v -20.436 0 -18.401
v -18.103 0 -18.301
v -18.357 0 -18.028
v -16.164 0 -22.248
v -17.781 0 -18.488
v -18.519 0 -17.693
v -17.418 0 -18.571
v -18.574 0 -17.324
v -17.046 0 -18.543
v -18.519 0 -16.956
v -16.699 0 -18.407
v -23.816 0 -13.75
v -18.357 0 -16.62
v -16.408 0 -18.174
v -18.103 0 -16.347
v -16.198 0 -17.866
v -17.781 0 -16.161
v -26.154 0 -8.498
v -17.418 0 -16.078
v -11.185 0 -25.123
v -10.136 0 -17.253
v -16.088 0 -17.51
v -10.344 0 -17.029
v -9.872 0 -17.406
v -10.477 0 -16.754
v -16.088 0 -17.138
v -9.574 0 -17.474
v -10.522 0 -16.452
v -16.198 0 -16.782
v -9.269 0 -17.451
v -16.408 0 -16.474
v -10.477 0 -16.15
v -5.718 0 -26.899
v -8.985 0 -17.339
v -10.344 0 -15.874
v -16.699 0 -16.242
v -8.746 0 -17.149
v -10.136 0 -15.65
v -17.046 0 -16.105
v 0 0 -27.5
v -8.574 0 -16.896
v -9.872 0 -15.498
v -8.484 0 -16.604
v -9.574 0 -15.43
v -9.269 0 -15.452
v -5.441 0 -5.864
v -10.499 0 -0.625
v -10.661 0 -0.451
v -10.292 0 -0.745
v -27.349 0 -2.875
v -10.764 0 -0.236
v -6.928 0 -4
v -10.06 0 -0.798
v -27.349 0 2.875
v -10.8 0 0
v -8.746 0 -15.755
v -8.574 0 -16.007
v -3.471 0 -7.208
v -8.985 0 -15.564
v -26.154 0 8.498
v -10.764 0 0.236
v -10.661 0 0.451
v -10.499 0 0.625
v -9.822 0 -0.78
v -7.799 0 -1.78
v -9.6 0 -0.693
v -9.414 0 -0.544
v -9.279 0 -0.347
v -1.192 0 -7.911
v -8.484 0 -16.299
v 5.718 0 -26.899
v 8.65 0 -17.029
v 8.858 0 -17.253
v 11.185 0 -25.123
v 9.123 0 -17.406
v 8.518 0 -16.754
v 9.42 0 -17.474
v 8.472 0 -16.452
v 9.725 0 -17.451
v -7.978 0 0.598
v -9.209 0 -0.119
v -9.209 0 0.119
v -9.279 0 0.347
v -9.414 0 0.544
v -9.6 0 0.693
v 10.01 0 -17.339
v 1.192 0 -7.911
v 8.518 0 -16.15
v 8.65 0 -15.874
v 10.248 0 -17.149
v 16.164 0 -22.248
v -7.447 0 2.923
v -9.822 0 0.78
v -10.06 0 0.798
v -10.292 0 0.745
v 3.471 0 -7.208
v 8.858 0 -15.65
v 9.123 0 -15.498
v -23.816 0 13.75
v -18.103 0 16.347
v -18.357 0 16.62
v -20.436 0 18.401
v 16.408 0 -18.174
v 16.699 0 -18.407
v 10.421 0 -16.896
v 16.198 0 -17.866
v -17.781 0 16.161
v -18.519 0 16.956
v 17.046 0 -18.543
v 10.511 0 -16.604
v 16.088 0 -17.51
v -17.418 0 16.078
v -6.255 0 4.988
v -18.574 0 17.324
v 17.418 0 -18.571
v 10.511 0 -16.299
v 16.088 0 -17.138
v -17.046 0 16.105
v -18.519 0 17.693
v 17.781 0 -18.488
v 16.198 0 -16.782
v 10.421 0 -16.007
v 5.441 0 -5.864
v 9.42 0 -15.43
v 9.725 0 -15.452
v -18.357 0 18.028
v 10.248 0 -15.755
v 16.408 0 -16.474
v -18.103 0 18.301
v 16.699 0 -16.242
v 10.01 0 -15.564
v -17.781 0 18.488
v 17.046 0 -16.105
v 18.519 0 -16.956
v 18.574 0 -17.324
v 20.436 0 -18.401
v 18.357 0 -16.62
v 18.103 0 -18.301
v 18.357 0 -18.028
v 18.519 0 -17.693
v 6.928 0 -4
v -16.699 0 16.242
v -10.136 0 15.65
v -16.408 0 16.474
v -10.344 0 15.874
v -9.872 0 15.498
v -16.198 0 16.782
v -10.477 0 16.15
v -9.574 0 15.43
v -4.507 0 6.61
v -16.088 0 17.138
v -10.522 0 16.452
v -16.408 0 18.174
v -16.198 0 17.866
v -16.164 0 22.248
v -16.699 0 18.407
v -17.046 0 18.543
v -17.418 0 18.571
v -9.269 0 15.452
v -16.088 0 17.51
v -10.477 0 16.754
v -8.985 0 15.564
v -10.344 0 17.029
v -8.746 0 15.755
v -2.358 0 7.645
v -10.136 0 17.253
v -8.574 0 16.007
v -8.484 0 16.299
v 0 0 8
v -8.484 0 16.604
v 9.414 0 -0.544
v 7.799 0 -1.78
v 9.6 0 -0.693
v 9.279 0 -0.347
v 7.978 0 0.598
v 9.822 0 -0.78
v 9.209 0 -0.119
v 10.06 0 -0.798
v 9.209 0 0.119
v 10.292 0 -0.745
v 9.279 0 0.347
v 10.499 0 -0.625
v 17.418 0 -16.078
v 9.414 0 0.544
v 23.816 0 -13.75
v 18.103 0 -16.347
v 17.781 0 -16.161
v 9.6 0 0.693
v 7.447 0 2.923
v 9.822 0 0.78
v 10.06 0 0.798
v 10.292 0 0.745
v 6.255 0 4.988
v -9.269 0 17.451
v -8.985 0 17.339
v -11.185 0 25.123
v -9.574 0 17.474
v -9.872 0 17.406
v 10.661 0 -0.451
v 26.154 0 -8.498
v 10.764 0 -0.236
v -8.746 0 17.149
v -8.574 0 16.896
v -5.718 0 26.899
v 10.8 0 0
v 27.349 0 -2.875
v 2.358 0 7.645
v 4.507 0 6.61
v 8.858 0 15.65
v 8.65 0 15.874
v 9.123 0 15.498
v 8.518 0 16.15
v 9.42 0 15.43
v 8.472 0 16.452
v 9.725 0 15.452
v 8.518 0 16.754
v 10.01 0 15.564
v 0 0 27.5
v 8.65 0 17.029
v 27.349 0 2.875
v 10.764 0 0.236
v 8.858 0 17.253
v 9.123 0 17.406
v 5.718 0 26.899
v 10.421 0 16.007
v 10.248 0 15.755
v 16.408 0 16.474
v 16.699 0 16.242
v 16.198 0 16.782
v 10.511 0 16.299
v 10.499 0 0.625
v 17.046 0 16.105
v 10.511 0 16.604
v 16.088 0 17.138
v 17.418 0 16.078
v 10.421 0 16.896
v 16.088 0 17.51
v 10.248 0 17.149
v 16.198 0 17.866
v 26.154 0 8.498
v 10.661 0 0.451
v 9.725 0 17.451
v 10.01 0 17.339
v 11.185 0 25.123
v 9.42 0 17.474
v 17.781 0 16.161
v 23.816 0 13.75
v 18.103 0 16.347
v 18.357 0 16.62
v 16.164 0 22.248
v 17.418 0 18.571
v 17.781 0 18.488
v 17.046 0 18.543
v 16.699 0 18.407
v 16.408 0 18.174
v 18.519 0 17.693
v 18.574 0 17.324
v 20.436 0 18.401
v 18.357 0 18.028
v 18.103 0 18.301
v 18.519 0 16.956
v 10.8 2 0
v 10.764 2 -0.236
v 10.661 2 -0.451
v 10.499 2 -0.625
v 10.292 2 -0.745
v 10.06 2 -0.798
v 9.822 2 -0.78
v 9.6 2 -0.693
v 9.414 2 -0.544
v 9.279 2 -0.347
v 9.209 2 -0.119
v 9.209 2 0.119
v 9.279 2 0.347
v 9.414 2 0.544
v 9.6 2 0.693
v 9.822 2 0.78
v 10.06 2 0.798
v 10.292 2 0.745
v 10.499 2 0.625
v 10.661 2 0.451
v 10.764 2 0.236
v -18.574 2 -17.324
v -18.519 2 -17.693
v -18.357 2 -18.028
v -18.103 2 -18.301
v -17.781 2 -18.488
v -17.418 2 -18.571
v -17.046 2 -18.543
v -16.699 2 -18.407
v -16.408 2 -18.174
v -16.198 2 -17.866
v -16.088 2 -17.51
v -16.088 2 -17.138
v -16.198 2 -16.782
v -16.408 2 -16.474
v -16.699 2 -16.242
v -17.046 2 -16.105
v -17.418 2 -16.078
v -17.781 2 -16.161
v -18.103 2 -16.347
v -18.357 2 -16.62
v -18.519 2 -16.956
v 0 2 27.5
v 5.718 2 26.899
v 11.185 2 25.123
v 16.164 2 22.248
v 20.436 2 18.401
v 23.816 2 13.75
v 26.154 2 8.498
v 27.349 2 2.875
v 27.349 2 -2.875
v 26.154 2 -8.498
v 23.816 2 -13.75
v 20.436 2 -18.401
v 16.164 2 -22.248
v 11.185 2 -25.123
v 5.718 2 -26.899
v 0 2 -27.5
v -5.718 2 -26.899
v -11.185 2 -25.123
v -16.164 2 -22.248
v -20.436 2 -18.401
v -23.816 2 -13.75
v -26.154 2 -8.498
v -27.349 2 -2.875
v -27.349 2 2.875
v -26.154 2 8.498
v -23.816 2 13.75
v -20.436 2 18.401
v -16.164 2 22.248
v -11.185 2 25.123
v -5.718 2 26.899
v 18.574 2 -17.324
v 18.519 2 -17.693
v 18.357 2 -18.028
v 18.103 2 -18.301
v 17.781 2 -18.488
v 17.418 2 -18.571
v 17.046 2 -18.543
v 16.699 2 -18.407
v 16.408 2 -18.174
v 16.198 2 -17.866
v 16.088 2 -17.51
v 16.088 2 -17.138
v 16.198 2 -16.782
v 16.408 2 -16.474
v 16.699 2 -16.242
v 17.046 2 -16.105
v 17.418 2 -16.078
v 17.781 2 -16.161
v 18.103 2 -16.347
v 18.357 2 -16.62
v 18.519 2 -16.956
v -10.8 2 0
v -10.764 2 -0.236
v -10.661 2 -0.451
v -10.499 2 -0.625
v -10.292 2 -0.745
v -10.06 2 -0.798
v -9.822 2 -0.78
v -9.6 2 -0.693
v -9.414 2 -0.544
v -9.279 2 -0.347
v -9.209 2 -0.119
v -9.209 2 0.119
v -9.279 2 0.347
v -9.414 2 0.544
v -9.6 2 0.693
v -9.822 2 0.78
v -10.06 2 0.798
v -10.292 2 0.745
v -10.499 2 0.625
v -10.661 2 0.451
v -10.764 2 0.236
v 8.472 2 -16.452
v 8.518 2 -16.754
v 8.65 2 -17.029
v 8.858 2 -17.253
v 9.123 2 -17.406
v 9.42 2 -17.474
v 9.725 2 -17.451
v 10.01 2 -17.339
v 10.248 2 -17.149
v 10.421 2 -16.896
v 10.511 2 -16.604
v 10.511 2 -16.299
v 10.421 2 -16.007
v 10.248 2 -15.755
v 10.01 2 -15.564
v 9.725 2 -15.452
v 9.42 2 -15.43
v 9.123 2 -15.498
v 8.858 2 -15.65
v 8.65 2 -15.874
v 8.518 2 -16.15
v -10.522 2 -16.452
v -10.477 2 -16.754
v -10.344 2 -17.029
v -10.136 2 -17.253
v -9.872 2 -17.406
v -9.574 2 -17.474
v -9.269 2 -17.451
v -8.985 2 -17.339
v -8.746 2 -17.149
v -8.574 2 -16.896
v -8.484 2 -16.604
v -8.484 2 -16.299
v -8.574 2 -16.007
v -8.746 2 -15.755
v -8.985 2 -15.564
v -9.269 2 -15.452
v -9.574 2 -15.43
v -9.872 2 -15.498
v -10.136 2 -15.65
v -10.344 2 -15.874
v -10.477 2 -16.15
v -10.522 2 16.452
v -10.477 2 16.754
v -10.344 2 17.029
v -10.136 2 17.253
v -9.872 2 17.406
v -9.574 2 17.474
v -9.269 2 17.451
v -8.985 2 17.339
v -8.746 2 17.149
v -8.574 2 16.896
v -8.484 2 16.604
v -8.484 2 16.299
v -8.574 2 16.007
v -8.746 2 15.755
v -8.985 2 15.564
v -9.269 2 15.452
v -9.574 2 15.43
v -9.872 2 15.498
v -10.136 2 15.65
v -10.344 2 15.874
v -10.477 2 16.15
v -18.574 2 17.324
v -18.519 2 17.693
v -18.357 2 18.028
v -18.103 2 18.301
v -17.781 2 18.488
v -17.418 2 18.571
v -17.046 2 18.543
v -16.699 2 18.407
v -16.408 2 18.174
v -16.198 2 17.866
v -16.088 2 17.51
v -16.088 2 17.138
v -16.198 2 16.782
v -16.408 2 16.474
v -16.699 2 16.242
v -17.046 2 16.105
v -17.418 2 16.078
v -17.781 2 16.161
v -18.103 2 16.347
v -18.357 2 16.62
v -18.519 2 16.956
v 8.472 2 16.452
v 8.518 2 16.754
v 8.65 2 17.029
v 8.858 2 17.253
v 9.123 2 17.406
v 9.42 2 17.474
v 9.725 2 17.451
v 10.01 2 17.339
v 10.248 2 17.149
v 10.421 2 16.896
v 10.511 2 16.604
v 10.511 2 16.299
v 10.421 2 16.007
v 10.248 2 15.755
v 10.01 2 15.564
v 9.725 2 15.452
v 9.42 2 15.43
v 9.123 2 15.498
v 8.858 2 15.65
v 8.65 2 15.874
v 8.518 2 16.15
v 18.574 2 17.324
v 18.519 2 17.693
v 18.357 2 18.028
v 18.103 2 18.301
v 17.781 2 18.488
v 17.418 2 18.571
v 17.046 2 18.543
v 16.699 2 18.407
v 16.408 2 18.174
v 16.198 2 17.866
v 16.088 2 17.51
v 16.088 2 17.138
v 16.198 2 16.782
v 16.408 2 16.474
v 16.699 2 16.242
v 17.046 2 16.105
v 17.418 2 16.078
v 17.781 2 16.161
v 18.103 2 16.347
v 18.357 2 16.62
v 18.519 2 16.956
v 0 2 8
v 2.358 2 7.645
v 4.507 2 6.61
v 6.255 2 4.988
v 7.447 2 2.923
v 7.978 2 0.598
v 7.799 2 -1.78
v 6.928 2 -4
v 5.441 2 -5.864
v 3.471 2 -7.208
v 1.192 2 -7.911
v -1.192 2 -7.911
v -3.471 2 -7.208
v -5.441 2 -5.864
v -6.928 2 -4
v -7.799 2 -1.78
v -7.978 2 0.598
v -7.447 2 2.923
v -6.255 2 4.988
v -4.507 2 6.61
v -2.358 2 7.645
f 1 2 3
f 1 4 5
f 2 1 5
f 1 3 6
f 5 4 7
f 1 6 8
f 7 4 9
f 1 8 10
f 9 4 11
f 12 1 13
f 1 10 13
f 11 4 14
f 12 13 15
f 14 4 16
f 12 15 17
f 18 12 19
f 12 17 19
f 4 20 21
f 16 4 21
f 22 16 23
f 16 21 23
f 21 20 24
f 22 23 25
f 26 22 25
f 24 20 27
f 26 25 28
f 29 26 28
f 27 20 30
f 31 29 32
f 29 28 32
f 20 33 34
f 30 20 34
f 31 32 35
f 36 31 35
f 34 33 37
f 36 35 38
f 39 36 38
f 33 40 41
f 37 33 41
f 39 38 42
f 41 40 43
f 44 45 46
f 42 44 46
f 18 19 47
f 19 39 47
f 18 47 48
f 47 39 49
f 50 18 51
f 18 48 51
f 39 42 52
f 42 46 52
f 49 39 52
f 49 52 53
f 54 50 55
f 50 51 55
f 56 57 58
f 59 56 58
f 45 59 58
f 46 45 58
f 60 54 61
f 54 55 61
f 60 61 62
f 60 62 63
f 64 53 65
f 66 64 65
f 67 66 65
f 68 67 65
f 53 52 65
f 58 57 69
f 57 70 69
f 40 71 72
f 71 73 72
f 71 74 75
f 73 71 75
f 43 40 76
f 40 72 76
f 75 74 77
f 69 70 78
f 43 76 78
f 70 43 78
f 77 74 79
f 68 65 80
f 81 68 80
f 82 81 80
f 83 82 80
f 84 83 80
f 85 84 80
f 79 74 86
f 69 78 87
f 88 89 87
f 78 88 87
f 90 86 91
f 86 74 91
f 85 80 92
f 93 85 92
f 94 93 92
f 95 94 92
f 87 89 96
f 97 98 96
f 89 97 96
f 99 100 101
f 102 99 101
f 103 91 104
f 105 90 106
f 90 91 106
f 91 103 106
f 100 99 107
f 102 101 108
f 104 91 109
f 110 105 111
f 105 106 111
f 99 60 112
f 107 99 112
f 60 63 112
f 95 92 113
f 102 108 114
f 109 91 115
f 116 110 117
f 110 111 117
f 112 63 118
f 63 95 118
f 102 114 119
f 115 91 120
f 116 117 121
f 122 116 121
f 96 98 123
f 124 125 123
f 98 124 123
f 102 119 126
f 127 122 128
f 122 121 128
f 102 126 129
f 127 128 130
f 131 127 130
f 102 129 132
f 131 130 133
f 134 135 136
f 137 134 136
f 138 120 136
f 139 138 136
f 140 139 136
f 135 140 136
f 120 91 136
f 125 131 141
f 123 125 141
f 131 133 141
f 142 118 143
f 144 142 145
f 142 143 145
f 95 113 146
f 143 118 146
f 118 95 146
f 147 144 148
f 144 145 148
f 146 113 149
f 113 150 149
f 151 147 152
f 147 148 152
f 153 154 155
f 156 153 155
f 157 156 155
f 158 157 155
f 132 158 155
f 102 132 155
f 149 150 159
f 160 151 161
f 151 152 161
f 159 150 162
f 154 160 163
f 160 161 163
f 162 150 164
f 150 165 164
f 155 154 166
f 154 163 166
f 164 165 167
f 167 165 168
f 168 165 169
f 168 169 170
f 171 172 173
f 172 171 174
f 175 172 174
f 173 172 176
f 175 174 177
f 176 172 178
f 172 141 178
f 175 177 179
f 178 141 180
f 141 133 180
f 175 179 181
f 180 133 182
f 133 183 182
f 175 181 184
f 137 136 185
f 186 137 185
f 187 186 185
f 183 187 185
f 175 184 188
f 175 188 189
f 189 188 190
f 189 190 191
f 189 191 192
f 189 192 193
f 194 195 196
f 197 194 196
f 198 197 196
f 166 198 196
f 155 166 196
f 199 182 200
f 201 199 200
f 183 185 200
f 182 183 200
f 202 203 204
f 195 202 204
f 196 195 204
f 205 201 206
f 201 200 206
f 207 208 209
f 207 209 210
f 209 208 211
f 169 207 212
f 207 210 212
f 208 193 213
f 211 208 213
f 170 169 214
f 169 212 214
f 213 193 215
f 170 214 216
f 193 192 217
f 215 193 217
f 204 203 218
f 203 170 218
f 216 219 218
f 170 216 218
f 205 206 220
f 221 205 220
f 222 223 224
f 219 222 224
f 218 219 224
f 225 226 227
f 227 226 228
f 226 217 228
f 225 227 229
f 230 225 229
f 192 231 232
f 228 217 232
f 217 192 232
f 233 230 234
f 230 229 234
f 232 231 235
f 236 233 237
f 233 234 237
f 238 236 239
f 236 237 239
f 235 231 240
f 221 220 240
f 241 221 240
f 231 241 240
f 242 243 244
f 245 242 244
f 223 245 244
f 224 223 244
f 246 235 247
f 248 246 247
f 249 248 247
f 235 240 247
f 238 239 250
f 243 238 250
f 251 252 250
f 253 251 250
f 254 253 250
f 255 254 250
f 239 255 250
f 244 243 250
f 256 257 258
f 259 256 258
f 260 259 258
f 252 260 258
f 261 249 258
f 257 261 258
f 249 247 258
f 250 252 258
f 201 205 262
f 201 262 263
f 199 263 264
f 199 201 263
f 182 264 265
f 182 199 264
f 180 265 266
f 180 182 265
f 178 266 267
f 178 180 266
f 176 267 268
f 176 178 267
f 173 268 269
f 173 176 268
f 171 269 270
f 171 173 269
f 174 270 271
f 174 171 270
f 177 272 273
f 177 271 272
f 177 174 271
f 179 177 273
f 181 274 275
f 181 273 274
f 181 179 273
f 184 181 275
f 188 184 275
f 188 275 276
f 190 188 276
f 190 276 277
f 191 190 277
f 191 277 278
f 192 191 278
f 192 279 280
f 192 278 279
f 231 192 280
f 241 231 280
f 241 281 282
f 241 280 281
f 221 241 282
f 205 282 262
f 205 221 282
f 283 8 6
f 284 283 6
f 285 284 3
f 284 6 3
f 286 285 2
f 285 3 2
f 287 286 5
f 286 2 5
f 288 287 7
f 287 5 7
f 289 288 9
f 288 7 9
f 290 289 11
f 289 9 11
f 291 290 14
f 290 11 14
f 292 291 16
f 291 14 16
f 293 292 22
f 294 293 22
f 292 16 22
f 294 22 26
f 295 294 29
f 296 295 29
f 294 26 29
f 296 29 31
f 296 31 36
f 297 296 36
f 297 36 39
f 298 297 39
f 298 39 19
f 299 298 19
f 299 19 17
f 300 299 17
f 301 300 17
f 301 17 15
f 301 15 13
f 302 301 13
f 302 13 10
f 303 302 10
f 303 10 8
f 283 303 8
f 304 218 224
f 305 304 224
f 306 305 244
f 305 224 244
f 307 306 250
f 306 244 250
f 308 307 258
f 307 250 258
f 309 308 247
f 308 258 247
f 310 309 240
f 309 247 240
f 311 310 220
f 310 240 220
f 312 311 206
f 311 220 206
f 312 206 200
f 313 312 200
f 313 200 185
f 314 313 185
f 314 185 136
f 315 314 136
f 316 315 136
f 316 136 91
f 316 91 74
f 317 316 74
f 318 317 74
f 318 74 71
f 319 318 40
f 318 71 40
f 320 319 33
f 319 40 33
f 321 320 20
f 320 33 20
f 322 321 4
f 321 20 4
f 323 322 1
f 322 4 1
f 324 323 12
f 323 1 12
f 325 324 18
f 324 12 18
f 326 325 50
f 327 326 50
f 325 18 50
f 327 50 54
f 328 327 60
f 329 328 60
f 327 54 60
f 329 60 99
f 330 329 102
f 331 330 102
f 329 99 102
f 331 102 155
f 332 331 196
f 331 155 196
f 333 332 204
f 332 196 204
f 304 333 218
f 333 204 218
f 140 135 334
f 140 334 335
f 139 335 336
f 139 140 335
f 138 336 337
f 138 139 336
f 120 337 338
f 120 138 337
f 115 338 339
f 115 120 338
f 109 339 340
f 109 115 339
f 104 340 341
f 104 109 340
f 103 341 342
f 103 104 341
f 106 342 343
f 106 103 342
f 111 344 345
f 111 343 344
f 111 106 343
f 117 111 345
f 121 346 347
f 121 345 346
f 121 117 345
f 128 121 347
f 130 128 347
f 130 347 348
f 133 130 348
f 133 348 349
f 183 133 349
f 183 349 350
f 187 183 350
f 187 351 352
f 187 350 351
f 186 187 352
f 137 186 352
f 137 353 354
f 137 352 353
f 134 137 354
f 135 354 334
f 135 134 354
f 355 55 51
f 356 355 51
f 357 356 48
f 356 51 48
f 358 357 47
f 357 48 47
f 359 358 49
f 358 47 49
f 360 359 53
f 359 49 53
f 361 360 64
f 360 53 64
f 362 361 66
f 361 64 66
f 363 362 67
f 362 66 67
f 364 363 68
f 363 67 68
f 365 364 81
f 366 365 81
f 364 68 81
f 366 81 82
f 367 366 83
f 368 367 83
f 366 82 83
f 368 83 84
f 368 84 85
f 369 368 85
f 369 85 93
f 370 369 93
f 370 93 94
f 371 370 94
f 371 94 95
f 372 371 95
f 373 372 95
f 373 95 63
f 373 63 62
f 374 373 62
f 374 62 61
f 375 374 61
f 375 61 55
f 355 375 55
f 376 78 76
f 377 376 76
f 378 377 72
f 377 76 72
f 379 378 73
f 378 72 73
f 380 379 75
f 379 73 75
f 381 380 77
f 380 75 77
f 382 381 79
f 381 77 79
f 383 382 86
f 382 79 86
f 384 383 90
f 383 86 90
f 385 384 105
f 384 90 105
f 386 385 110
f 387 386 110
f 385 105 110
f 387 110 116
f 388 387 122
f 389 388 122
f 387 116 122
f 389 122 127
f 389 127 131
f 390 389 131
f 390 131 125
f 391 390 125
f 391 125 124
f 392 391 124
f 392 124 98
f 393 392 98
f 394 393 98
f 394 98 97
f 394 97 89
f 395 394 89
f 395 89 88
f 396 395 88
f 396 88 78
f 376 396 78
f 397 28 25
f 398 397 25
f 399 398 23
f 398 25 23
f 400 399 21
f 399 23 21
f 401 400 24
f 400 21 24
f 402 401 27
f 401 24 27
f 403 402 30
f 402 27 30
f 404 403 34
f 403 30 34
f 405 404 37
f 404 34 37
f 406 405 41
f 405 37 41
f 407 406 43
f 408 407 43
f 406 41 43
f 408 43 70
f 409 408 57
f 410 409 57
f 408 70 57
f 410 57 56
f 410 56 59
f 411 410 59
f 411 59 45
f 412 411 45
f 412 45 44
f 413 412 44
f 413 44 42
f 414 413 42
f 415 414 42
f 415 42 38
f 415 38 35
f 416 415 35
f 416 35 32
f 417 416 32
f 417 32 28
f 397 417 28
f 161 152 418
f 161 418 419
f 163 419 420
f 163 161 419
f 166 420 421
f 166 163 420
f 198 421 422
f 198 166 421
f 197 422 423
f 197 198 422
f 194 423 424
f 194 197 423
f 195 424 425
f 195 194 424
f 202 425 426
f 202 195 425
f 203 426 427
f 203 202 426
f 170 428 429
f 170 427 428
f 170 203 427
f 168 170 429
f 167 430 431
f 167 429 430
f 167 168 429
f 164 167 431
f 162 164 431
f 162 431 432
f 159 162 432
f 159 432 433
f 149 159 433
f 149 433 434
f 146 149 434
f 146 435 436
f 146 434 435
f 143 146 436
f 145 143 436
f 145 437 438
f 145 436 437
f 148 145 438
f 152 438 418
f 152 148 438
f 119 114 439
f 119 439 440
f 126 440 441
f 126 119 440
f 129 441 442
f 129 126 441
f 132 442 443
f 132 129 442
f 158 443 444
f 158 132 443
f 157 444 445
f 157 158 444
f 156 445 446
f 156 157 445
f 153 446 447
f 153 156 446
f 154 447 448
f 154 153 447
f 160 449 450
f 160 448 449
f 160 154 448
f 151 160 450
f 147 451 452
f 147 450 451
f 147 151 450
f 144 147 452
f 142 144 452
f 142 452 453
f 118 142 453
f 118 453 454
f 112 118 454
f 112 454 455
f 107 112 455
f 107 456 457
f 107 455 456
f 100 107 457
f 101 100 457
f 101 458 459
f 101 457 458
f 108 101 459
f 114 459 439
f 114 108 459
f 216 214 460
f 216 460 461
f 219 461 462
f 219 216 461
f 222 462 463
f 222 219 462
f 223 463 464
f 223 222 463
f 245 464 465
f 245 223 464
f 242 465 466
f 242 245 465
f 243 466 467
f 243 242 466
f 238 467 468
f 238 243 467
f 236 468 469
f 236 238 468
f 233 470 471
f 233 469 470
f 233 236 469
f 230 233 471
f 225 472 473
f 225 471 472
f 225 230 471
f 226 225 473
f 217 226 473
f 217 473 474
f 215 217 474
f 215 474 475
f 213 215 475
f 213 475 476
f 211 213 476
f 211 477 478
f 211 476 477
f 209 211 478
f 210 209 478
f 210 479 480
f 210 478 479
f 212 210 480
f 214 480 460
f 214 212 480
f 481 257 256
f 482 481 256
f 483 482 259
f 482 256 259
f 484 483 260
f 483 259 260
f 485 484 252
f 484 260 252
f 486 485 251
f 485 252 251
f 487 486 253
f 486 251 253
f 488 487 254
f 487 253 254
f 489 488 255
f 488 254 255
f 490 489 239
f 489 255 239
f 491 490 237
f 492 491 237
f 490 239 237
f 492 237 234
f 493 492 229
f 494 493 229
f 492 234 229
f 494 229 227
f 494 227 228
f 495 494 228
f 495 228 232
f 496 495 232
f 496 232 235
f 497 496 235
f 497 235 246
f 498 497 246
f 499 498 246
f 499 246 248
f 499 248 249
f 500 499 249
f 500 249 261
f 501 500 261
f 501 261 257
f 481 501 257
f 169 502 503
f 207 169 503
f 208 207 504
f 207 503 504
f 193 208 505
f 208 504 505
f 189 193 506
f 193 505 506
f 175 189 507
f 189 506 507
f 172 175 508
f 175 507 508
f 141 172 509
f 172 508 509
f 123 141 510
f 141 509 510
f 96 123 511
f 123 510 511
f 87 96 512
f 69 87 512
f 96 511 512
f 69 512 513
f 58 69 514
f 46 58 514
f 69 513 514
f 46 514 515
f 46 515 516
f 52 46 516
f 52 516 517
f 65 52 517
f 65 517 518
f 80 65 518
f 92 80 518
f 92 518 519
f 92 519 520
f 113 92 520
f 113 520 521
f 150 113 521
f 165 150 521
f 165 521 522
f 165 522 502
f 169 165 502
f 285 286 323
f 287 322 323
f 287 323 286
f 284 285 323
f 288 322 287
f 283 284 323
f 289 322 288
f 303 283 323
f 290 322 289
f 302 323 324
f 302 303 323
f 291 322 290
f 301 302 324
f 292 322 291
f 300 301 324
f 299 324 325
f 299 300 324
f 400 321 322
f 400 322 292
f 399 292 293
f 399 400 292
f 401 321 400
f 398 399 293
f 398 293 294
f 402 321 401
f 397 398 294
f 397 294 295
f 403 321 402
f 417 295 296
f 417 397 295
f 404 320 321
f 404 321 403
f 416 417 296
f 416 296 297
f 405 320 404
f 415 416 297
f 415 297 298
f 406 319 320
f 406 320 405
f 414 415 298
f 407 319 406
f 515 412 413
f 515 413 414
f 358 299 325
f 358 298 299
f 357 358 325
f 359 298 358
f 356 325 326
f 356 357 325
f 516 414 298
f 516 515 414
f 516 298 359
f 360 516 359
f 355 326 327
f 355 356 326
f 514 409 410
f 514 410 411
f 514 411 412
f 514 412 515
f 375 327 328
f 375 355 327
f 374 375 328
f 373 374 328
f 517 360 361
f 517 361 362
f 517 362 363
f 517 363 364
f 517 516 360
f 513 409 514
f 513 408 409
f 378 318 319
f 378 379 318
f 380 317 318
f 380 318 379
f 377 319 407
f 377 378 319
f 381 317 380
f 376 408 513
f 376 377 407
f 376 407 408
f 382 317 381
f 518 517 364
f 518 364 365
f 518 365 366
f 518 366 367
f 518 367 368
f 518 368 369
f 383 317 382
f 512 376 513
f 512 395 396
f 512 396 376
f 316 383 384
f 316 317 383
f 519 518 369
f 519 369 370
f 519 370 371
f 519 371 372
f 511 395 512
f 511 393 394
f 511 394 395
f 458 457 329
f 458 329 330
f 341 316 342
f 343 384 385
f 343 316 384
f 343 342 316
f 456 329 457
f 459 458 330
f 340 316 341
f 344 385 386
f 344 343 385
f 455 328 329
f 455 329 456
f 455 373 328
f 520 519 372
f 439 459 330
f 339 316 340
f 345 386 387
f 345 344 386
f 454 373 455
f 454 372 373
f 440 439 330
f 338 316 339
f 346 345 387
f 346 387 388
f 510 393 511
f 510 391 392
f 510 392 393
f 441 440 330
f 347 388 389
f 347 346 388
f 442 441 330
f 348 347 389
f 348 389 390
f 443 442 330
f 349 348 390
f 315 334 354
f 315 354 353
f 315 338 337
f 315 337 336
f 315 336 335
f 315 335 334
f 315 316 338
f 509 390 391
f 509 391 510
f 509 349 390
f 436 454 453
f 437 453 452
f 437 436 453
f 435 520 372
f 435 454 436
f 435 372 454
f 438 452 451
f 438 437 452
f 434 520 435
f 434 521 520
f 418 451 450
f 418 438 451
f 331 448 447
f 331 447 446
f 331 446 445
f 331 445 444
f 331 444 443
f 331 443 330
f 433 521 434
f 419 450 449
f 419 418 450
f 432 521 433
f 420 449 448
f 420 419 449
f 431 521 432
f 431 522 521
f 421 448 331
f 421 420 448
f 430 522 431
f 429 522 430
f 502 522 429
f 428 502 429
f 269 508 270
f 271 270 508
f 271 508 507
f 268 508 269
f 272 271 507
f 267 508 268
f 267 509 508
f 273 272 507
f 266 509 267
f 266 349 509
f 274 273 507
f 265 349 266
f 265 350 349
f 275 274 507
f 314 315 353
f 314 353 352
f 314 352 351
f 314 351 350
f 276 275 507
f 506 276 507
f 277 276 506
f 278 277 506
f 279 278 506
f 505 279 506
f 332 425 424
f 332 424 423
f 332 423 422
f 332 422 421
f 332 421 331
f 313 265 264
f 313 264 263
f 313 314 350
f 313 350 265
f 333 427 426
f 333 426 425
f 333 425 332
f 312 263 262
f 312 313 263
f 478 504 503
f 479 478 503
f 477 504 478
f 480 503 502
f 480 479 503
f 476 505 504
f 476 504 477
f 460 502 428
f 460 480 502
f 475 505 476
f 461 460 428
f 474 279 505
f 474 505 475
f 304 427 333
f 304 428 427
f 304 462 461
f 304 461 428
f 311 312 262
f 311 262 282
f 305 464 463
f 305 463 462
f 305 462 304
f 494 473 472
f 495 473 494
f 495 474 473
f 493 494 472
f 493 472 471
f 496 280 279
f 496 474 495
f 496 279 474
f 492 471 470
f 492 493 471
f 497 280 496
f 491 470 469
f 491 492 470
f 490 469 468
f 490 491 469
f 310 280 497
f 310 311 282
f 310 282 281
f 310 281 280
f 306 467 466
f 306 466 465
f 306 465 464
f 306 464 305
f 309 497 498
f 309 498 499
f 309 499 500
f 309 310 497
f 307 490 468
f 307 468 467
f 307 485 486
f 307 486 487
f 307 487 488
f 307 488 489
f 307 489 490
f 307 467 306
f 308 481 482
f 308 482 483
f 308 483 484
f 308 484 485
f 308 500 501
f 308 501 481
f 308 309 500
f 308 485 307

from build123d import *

# Parameters (mm, degrees)
SKETCH_1_R           = 27.5
EXTRUDE_1_DEPTH      = 2
SKETCH_2_R           = 8
CUT_EXTRUDE_1_DEPTH  = 39.942264957
HOLE_WIZARD_M2_1_D   = 1.6
HOLE_WIZARD_M3_4_D   = 2.5
MIRROR_2_COPY_1_D    = 2.5
HOLE_WIZARD_M2_5_1_D = 2.05


with BuildPart() as part:
    # 草图1 → 凸台-拉伸1 (new body)
    with BuildSketch(Plane(origin=(0, 0, 0), x_dir=(1, 0, 0), z_dir=(0, 1, 0))):
        with Locations(Location((0, 0, 0), (0, 0, 270))):
            Circle(SKETCH_1_R)
    extrude(amount=EXTRUDE_1_DEPTH)

    # 草图2 → 切除-拉伸1 (cut, through all)
    with BuildSketch(Plane(origin=(0, 2, 0), x_dir=(1, 0, 0), z_dir=(0, 1, 0))):
        with Locations(Location((0, 0, 0), (0, 0, 270))):
            Circle(SKETCH_2_R)
    extrude(amount=-CUT_EXTRUDE_1_DEPTH, mode=Mode.SUBTRACT)

    # M2 螺纹孔1 (through all)
    with Locations(Plane(origin=(0, 2, 0), x_dir=(1, 0, 0), z_dir=(0, 1, 0))):
        with Locations((-10, 0)):
            hole_wizard_m2_1 = Hole(HOLE_WIZARD_M2_1_D / 2)

    # M3 螺纹孔4 (through all)
    with Locations(Plane(origin=(0, 2, 0), x_dir=(1, 0, 0), z_dir=(0, 1, 0))):
        with Locations((-17.324116139, 17.324116139)):
            hole_wizard_m3_4 = Hole(HOLE_WIZARD_M3_4_D / 2)

    # 镜向1: M3 螺纹孔4 across plane
    add(hole_wizard_m3_4.mirror(Plane(origin=(0, 0, 0), x_dir=(0, 0, 1), z_dir=(1, 0, 0))), mode=Mode.SUBTRACT)

    # 镜向2: M3 螺纹孔4 across plane
    add(hole_wizard_m3_4.mirror(Plane.XY), mode=Mode.SUBTRACT)

    # 镜向2 copy 1 (through all)
    with Locations(Plane(origin=(0, 2, 0), x_dir=(-1, 0, 0), z_dir=(0, 1, 0))):
        with Locations((-17.324116139, 17.324116139)):
            Hole(MIRROR_2_COPY_1_D / 2)

    # 镜向3: M2 螺纹孔1 across plane
    add(hole_wizard_m2_1.mirror(Plane(origin=(0, 0, 0), x_dir=(0, 0, 1), z_dir=(1, 0, 0))), mode=Mode.SUBTRACT)

    # M2.5 螺纹孔1 (through all)
    with Locations(Plane(origin=(0, 2, 0), x_dir=(1, 0, 0), z_dir=(0, 1, 0))):
        with Locations((-9.497088469, 16.451681088), (9.497088469, 16.451681088)):
            hole_wizard_m2_5_1 = Hole(HOLE_WIZARD_M2_5_1_D / 2)

    # 镜向4: M2.5 螺纹孔1 across plane
    add(hole_wizard_m2_5_1.mirror(Plane.XY), mode=Mode.SUBTRACT)


solid = part.part
